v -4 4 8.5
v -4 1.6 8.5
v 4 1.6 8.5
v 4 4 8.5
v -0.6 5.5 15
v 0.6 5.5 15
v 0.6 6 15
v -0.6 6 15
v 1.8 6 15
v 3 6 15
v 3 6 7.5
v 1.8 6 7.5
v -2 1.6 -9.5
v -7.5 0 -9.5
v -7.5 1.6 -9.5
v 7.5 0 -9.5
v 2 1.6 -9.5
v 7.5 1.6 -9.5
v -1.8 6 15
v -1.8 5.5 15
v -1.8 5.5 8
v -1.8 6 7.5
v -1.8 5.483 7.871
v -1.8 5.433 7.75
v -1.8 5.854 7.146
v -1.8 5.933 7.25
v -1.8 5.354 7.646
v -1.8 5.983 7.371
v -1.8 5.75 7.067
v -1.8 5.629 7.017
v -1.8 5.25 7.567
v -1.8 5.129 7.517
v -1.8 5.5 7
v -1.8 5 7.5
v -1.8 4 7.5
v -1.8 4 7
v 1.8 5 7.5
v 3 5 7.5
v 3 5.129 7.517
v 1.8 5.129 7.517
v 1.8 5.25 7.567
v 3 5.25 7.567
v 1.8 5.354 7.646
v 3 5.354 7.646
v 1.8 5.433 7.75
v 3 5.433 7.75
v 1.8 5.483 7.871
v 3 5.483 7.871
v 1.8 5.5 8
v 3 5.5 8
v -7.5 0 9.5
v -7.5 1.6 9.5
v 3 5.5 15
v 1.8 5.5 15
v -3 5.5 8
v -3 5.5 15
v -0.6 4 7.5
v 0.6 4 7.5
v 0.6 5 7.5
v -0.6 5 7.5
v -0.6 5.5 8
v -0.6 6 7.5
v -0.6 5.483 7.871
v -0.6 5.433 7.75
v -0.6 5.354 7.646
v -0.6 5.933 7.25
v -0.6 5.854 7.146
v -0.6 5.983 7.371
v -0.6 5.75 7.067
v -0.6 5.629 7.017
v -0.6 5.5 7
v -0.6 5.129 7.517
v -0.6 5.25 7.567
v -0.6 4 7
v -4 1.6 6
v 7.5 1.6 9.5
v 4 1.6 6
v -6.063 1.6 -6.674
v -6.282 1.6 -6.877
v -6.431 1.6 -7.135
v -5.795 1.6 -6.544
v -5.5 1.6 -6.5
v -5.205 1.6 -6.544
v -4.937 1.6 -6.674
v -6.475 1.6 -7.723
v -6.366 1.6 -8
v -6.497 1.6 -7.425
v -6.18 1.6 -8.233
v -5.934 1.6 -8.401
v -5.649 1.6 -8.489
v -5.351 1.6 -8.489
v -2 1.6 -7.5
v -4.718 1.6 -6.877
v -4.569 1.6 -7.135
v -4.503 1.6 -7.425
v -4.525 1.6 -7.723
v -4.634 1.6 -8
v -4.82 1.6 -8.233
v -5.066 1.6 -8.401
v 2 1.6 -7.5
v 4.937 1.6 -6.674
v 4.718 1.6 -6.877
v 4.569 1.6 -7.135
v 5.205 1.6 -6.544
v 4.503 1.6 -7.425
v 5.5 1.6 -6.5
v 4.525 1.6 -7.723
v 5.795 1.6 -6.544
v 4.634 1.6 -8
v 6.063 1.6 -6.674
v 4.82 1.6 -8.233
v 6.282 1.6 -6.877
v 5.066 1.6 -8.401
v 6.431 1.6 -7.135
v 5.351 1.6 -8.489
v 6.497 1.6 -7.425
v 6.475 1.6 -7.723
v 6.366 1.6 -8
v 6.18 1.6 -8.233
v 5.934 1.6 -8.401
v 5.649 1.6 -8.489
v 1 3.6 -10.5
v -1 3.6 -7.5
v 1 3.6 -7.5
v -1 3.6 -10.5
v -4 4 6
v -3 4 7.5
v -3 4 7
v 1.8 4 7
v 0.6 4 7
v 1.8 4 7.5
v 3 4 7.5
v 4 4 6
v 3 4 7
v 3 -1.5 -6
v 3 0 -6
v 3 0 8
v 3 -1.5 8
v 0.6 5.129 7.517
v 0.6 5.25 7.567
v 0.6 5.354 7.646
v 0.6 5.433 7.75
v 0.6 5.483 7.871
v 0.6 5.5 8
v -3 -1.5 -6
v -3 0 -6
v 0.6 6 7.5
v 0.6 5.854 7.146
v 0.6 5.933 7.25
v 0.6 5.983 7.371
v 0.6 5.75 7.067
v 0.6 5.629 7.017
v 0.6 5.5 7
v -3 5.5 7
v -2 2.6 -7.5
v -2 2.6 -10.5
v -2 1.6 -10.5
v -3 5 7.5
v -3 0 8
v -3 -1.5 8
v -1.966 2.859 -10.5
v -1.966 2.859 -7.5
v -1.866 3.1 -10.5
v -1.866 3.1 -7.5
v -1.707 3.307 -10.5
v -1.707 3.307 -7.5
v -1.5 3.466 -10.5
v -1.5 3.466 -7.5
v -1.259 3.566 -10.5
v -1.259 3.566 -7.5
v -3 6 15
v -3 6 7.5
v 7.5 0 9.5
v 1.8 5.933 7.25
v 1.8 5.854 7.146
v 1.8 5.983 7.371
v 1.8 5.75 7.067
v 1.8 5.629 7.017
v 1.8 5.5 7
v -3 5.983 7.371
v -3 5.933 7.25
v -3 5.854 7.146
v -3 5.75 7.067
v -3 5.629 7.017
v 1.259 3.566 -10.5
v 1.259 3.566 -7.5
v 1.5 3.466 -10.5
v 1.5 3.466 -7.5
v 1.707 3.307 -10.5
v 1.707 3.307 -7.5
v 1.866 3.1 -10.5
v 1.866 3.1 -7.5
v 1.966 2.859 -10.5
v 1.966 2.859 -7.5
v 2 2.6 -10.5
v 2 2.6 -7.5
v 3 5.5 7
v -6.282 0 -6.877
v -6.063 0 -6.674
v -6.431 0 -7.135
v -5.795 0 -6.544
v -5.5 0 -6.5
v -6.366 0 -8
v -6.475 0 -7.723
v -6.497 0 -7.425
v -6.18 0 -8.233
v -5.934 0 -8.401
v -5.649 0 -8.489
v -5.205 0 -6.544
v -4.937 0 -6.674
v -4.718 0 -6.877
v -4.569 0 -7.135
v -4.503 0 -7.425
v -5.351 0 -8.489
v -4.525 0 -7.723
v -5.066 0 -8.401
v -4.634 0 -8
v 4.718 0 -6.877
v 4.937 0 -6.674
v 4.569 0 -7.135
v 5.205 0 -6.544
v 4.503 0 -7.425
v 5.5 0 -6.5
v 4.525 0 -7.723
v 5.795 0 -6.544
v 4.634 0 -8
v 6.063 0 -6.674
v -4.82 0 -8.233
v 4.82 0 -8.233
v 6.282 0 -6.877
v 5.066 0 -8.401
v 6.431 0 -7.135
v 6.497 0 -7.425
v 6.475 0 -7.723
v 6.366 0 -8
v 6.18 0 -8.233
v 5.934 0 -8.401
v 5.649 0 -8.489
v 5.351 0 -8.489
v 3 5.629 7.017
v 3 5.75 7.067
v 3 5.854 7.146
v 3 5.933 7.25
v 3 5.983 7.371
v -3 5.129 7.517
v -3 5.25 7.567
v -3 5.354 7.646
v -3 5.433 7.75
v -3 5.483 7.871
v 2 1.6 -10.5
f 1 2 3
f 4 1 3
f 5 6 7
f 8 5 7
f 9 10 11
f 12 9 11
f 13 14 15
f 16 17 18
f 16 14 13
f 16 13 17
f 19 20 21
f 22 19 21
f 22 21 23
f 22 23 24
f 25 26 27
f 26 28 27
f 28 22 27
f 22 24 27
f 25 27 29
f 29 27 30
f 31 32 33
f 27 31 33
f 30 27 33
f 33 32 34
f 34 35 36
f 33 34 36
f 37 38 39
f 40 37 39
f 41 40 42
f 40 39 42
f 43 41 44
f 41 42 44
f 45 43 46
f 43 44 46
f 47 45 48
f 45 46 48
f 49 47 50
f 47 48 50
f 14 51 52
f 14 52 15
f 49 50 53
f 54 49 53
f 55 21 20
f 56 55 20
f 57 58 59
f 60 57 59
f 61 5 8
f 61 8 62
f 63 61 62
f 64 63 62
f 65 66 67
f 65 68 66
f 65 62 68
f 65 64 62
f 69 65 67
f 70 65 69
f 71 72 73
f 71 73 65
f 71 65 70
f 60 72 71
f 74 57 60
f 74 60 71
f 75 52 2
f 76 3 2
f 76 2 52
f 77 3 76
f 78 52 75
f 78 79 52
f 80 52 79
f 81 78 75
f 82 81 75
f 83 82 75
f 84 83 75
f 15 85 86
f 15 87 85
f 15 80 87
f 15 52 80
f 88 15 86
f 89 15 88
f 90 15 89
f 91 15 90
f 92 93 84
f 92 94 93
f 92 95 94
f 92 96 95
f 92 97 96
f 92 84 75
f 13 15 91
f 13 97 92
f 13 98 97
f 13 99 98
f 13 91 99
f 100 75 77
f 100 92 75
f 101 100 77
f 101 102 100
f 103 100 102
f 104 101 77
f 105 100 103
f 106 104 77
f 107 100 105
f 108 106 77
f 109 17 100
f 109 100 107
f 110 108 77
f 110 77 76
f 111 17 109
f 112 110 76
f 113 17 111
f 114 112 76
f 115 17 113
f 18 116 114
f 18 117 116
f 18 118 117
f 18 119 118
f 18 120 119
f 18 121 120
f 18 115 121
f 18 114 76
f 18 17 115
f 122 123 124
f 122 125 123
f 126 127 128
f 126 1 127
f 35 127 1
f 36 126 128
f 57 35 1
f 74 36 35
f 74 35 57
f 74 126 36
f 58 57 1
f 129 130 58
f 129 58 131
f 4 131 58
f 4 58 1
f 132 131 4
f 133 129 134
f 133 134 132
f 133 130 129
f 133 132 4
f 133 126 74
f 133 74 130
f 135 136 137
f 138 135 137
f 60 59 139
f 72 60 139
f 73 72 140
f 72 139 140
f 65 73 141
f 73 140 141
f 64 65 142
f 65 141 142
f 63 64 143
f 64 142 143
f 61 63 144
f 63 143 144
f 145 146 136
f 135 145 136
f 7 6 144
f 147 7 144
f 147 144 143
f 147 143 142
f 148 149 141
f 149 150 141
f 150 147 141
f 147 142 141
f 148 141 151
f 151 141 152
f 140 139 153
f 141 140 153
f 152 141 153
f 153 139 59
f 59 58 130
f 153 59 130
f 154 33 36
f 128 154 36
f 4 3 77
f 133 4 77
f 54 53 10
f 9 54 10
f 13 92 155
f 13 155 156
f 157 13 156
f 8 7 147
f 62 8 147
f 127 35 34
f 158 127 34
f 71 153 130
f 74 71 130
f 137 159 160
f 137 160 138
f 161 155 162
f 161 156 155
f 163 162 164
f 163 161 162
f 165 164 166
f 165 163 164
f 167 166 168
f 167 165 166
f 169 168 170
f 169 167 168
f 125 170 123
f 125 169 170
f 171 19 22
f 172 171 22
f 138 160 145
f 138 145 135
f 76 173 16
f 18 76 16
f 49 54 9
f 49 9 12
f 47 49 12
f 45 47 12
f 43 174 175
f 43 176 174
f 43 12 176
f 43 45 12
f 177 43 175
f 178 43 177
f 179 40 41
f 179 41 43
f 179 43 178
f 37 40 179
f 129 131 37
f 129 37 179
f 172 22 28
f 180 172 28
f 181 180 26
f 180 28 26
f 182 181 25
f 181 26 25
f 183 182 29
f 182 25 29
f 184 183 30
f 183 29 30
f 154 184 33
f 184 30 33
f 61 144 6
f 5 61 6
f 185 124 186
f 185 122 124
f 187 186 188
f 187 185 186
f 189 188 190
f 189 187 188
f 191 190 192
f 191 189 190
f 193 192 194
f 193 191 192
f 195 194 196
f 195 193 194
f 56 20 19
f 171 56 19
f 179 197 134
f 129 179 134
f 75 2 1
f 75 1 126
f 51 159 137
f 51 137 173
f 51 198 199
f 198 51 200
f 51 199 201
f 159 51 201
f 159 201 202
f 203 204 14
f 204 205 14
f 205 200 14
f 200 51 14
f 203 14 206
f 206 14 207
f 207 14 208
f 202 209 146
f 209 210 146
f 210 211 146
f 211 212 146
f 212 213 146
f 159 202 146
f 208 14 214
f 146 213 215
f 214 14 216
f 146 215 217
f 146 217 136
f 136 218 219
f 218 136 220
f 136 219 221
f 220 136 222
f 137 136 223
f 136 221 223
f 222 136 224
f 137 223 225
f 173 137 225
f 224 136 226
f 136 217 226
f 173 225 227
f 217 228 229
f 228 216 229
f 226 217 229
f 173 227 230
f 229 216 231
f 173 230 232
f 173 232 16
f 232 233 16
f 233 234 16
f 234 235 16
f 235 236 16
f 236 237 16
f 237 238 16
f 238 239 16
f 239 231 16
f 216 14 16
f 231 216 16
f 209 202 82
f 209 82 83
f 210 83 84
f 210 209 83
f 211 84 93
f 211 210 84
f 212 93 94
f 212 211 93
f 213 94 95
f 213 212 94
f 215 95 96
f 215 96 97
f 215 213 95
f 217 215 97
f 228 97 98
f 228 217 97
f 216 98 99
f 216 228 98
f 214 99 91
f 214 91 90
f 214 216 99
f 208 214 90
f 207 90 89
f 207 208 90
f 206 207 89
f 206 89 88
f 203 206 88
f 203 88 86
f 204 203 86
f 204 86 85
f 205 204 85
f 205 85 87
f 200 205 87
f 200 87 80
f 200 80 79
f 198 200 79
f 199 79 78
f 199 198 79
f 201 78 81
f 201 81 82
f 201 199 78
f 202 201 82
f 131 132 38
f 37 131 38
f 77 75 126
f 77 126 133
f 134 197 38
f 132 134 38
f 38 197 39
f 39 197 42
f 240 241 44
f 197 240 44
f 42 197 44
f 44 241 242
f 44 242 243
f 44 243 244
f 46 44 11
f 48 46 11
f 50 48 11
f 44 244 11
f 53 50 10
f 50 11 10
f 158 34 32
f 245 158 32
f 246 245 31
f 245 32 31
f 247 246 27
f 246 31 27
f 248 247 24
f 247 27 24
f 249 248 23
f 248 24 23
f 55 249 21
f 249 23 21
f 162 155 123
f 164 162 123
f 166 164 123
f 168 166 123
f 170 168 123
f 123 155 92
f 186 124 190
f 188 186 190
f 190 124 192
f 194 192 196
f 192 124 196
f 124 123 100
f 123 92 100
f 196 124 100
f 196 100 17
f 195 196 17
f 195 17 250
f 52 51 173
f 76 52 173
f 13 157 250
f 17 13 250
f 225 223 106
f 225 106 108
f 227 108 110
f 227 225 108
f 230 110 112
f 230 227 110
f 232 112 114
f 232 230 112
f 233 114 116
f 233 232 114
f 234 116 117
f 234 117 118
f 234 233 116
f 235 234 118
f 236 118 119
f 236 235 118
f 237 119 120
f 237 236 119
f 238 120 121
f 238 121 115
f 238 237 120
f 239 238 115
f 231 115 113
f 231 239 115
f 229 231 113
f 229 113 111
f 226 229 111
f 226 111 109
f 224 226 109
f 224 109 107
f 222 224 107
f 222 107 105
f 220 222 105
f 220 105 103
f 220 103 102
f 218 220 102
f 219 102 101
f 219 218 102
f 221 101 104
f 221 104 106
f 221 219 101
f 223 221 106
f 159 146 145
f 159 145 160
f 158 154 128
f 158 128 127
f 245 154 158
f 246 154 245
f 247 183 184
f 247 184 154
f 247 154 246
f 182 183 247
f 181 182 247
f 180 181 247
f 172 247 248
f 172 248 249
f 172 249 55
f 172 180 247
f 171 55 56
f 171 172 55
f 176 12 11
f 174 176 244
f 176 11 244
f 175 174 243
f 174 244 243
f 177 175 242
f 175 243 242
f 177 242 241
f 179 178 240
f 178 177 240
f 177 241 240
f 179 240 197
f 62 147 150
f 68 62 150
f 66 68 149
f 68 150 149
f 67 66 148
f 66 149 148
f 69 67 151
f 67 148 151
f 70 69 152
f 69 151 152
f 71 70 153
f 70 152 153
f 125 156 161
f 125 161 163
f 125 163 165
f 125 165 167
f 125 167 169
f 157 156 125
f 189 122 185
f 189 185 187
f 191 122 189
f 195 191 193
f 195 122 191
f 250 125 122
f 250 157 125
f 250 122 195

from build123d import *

# Parameters (mm, degrees)
ESBO_O1_W                = 15
ESBO_O1_H                = 19
ESBO_O1_R                = 1
RESSALTO_EXTRUS_O1_DEPTH = 1.6
ESBO_O3_W                = 4
ESBO_O3_H                = 3
RESSALTO_EXTRUS_O2_DEPTH = 2
FILETE1_R                = 1
ESBO_O4_W                = 8
ESBO_O4_H                = 2.5
RESSALTO_EXTRUS_O3_DEPTH = 2.4
RESSALTO_EXTRUS_O4_DEPTH = 3
CORTE_EXTRUS_O1_START    = -2
ESBO_O6_W                = 1.2
ESBO_O6_H                = 8
CORTE_EXTRUS_O1_DEPTH    = 2
ESBO_O7_W                = 6
ESBO_O7_H                = 14
RESSALTO_EXTRUS_O5_DEPTH = 1.5


with BuildPart() as part:
    # Esboço1 → Ressalto-extrusão1 (new body)
    with BuildSketch(Plane(origin=(0, 0, 0), x_dir=(1, 0, 0), z_dir=(0, 1, 0))):
        Rectangle(ESBO_O1_W, ESBO_O1_H)
        with Locations(Location((-5.5, 7.5, 0), (0, 0, 270))):
            Circle(ESBO_O1_R, mode=Mode.SUBTRACT)
        with Locations(Location((5.5, 7.5, 0), (0, 0, 270))):
            Circle(ESBO_O1_R, mode=Mode.SUBTRACT)
    extrude(amount=RESSALTO_EXTRUS_O1_DEPTH)

    # Esboço3 → Ressalto-extrusão2 (add)
    with BuildSketch(Plane(origin=(0, 1.6, 0), x_dir=(1, 0, 0), z_dir=(0, 1, 0))):
        with Locations((0, 9)):
            Rectangle(ESBO_O3_W, ESBO_O3_H)
    extrude(amount=RESSALTO_EXTRUS_O2_DEPTH)

    # Filete1
    filete1_edges = [part.edges().sort_by_distance(p)[0] for p in [
        (2, 3.6, -9),
        (-2, 3.6, -9),
    ]]
    fillet(filete1_edges, radius=FILETE1_R)

    # Esboço4 → Ressalto-extrusão3 (add)
    with BuildSketch(Plane(origin=(0, 1.6, 0), x_dir=(1, 0, 0), z_dir=(0, 1, 0))):
        with Locations((0, -7.25)):
            Rectangle(ESBO_O4_W, ESBO_O4_H)
    extrude(amount=RESSALTO_EXTRUS_O3_DEPTH)

    # Esboço5 → Ressalto-extrusão4 (add, symmetric)
    with BuildSketch(Plane(origin=(0, 0, 0), x_dir=(0, 0, -1), z_dir=(1, 0, 0))):
        with BuildLine():
            Line((-7.5, 4), (-7.5, 5))
            ThreePointArc((-7.5, 5), (-7.646446609, 5.353553391), (-8, 5.5))
            Line((-8, 5.5), (-15, 5.5))
            Line((-15, 5.5), (-15, 6))
            Line((-15, 6), (-7.5, 6))
            ThreePointArc((-7.5, 6), (-7.146446609, 5.853553391), (-7, 5.5))
            Line((-7, 5.5), (-7, 4))
            Line((-7, 4), (-7.5, 4))
        make_face()
    extrude(amount=RESSALTO_EXTRUS_O4_DEPTH, both=True)

    # Esboço6 → Corte-extrusão1 (cut)
    with BuildSketch(Plane(origin=(0, 6, 0), x_dir=(1, 0, 0), z_dir=(0, 1, 0)).offset(CORTE_EXTRUS_O1_START)):
        with Locations((-1.2, -11)):
            Rectangle(ESBO_O6_W, ESBO_O6_H)
        with Locations((1.2, -11)):
            Rectangle(ESBO_O6_W, ESBO_O6_H)
    extrude(amount=CORTE_EXTRUS_O1_DEPTH, mode=Mode.SUBTRACT)

    # Esboço7 → Ressalto-extrusão5 (add)
    with BuildSketch(Plane.XZ):
        with Locations((0, 1)):
            Rectangle(ESBO_O7_W, ESBO_O7_H)
    extrude(amount=RESSALTO_EXTRUS_O5_DEPTH)


solid = part.part
